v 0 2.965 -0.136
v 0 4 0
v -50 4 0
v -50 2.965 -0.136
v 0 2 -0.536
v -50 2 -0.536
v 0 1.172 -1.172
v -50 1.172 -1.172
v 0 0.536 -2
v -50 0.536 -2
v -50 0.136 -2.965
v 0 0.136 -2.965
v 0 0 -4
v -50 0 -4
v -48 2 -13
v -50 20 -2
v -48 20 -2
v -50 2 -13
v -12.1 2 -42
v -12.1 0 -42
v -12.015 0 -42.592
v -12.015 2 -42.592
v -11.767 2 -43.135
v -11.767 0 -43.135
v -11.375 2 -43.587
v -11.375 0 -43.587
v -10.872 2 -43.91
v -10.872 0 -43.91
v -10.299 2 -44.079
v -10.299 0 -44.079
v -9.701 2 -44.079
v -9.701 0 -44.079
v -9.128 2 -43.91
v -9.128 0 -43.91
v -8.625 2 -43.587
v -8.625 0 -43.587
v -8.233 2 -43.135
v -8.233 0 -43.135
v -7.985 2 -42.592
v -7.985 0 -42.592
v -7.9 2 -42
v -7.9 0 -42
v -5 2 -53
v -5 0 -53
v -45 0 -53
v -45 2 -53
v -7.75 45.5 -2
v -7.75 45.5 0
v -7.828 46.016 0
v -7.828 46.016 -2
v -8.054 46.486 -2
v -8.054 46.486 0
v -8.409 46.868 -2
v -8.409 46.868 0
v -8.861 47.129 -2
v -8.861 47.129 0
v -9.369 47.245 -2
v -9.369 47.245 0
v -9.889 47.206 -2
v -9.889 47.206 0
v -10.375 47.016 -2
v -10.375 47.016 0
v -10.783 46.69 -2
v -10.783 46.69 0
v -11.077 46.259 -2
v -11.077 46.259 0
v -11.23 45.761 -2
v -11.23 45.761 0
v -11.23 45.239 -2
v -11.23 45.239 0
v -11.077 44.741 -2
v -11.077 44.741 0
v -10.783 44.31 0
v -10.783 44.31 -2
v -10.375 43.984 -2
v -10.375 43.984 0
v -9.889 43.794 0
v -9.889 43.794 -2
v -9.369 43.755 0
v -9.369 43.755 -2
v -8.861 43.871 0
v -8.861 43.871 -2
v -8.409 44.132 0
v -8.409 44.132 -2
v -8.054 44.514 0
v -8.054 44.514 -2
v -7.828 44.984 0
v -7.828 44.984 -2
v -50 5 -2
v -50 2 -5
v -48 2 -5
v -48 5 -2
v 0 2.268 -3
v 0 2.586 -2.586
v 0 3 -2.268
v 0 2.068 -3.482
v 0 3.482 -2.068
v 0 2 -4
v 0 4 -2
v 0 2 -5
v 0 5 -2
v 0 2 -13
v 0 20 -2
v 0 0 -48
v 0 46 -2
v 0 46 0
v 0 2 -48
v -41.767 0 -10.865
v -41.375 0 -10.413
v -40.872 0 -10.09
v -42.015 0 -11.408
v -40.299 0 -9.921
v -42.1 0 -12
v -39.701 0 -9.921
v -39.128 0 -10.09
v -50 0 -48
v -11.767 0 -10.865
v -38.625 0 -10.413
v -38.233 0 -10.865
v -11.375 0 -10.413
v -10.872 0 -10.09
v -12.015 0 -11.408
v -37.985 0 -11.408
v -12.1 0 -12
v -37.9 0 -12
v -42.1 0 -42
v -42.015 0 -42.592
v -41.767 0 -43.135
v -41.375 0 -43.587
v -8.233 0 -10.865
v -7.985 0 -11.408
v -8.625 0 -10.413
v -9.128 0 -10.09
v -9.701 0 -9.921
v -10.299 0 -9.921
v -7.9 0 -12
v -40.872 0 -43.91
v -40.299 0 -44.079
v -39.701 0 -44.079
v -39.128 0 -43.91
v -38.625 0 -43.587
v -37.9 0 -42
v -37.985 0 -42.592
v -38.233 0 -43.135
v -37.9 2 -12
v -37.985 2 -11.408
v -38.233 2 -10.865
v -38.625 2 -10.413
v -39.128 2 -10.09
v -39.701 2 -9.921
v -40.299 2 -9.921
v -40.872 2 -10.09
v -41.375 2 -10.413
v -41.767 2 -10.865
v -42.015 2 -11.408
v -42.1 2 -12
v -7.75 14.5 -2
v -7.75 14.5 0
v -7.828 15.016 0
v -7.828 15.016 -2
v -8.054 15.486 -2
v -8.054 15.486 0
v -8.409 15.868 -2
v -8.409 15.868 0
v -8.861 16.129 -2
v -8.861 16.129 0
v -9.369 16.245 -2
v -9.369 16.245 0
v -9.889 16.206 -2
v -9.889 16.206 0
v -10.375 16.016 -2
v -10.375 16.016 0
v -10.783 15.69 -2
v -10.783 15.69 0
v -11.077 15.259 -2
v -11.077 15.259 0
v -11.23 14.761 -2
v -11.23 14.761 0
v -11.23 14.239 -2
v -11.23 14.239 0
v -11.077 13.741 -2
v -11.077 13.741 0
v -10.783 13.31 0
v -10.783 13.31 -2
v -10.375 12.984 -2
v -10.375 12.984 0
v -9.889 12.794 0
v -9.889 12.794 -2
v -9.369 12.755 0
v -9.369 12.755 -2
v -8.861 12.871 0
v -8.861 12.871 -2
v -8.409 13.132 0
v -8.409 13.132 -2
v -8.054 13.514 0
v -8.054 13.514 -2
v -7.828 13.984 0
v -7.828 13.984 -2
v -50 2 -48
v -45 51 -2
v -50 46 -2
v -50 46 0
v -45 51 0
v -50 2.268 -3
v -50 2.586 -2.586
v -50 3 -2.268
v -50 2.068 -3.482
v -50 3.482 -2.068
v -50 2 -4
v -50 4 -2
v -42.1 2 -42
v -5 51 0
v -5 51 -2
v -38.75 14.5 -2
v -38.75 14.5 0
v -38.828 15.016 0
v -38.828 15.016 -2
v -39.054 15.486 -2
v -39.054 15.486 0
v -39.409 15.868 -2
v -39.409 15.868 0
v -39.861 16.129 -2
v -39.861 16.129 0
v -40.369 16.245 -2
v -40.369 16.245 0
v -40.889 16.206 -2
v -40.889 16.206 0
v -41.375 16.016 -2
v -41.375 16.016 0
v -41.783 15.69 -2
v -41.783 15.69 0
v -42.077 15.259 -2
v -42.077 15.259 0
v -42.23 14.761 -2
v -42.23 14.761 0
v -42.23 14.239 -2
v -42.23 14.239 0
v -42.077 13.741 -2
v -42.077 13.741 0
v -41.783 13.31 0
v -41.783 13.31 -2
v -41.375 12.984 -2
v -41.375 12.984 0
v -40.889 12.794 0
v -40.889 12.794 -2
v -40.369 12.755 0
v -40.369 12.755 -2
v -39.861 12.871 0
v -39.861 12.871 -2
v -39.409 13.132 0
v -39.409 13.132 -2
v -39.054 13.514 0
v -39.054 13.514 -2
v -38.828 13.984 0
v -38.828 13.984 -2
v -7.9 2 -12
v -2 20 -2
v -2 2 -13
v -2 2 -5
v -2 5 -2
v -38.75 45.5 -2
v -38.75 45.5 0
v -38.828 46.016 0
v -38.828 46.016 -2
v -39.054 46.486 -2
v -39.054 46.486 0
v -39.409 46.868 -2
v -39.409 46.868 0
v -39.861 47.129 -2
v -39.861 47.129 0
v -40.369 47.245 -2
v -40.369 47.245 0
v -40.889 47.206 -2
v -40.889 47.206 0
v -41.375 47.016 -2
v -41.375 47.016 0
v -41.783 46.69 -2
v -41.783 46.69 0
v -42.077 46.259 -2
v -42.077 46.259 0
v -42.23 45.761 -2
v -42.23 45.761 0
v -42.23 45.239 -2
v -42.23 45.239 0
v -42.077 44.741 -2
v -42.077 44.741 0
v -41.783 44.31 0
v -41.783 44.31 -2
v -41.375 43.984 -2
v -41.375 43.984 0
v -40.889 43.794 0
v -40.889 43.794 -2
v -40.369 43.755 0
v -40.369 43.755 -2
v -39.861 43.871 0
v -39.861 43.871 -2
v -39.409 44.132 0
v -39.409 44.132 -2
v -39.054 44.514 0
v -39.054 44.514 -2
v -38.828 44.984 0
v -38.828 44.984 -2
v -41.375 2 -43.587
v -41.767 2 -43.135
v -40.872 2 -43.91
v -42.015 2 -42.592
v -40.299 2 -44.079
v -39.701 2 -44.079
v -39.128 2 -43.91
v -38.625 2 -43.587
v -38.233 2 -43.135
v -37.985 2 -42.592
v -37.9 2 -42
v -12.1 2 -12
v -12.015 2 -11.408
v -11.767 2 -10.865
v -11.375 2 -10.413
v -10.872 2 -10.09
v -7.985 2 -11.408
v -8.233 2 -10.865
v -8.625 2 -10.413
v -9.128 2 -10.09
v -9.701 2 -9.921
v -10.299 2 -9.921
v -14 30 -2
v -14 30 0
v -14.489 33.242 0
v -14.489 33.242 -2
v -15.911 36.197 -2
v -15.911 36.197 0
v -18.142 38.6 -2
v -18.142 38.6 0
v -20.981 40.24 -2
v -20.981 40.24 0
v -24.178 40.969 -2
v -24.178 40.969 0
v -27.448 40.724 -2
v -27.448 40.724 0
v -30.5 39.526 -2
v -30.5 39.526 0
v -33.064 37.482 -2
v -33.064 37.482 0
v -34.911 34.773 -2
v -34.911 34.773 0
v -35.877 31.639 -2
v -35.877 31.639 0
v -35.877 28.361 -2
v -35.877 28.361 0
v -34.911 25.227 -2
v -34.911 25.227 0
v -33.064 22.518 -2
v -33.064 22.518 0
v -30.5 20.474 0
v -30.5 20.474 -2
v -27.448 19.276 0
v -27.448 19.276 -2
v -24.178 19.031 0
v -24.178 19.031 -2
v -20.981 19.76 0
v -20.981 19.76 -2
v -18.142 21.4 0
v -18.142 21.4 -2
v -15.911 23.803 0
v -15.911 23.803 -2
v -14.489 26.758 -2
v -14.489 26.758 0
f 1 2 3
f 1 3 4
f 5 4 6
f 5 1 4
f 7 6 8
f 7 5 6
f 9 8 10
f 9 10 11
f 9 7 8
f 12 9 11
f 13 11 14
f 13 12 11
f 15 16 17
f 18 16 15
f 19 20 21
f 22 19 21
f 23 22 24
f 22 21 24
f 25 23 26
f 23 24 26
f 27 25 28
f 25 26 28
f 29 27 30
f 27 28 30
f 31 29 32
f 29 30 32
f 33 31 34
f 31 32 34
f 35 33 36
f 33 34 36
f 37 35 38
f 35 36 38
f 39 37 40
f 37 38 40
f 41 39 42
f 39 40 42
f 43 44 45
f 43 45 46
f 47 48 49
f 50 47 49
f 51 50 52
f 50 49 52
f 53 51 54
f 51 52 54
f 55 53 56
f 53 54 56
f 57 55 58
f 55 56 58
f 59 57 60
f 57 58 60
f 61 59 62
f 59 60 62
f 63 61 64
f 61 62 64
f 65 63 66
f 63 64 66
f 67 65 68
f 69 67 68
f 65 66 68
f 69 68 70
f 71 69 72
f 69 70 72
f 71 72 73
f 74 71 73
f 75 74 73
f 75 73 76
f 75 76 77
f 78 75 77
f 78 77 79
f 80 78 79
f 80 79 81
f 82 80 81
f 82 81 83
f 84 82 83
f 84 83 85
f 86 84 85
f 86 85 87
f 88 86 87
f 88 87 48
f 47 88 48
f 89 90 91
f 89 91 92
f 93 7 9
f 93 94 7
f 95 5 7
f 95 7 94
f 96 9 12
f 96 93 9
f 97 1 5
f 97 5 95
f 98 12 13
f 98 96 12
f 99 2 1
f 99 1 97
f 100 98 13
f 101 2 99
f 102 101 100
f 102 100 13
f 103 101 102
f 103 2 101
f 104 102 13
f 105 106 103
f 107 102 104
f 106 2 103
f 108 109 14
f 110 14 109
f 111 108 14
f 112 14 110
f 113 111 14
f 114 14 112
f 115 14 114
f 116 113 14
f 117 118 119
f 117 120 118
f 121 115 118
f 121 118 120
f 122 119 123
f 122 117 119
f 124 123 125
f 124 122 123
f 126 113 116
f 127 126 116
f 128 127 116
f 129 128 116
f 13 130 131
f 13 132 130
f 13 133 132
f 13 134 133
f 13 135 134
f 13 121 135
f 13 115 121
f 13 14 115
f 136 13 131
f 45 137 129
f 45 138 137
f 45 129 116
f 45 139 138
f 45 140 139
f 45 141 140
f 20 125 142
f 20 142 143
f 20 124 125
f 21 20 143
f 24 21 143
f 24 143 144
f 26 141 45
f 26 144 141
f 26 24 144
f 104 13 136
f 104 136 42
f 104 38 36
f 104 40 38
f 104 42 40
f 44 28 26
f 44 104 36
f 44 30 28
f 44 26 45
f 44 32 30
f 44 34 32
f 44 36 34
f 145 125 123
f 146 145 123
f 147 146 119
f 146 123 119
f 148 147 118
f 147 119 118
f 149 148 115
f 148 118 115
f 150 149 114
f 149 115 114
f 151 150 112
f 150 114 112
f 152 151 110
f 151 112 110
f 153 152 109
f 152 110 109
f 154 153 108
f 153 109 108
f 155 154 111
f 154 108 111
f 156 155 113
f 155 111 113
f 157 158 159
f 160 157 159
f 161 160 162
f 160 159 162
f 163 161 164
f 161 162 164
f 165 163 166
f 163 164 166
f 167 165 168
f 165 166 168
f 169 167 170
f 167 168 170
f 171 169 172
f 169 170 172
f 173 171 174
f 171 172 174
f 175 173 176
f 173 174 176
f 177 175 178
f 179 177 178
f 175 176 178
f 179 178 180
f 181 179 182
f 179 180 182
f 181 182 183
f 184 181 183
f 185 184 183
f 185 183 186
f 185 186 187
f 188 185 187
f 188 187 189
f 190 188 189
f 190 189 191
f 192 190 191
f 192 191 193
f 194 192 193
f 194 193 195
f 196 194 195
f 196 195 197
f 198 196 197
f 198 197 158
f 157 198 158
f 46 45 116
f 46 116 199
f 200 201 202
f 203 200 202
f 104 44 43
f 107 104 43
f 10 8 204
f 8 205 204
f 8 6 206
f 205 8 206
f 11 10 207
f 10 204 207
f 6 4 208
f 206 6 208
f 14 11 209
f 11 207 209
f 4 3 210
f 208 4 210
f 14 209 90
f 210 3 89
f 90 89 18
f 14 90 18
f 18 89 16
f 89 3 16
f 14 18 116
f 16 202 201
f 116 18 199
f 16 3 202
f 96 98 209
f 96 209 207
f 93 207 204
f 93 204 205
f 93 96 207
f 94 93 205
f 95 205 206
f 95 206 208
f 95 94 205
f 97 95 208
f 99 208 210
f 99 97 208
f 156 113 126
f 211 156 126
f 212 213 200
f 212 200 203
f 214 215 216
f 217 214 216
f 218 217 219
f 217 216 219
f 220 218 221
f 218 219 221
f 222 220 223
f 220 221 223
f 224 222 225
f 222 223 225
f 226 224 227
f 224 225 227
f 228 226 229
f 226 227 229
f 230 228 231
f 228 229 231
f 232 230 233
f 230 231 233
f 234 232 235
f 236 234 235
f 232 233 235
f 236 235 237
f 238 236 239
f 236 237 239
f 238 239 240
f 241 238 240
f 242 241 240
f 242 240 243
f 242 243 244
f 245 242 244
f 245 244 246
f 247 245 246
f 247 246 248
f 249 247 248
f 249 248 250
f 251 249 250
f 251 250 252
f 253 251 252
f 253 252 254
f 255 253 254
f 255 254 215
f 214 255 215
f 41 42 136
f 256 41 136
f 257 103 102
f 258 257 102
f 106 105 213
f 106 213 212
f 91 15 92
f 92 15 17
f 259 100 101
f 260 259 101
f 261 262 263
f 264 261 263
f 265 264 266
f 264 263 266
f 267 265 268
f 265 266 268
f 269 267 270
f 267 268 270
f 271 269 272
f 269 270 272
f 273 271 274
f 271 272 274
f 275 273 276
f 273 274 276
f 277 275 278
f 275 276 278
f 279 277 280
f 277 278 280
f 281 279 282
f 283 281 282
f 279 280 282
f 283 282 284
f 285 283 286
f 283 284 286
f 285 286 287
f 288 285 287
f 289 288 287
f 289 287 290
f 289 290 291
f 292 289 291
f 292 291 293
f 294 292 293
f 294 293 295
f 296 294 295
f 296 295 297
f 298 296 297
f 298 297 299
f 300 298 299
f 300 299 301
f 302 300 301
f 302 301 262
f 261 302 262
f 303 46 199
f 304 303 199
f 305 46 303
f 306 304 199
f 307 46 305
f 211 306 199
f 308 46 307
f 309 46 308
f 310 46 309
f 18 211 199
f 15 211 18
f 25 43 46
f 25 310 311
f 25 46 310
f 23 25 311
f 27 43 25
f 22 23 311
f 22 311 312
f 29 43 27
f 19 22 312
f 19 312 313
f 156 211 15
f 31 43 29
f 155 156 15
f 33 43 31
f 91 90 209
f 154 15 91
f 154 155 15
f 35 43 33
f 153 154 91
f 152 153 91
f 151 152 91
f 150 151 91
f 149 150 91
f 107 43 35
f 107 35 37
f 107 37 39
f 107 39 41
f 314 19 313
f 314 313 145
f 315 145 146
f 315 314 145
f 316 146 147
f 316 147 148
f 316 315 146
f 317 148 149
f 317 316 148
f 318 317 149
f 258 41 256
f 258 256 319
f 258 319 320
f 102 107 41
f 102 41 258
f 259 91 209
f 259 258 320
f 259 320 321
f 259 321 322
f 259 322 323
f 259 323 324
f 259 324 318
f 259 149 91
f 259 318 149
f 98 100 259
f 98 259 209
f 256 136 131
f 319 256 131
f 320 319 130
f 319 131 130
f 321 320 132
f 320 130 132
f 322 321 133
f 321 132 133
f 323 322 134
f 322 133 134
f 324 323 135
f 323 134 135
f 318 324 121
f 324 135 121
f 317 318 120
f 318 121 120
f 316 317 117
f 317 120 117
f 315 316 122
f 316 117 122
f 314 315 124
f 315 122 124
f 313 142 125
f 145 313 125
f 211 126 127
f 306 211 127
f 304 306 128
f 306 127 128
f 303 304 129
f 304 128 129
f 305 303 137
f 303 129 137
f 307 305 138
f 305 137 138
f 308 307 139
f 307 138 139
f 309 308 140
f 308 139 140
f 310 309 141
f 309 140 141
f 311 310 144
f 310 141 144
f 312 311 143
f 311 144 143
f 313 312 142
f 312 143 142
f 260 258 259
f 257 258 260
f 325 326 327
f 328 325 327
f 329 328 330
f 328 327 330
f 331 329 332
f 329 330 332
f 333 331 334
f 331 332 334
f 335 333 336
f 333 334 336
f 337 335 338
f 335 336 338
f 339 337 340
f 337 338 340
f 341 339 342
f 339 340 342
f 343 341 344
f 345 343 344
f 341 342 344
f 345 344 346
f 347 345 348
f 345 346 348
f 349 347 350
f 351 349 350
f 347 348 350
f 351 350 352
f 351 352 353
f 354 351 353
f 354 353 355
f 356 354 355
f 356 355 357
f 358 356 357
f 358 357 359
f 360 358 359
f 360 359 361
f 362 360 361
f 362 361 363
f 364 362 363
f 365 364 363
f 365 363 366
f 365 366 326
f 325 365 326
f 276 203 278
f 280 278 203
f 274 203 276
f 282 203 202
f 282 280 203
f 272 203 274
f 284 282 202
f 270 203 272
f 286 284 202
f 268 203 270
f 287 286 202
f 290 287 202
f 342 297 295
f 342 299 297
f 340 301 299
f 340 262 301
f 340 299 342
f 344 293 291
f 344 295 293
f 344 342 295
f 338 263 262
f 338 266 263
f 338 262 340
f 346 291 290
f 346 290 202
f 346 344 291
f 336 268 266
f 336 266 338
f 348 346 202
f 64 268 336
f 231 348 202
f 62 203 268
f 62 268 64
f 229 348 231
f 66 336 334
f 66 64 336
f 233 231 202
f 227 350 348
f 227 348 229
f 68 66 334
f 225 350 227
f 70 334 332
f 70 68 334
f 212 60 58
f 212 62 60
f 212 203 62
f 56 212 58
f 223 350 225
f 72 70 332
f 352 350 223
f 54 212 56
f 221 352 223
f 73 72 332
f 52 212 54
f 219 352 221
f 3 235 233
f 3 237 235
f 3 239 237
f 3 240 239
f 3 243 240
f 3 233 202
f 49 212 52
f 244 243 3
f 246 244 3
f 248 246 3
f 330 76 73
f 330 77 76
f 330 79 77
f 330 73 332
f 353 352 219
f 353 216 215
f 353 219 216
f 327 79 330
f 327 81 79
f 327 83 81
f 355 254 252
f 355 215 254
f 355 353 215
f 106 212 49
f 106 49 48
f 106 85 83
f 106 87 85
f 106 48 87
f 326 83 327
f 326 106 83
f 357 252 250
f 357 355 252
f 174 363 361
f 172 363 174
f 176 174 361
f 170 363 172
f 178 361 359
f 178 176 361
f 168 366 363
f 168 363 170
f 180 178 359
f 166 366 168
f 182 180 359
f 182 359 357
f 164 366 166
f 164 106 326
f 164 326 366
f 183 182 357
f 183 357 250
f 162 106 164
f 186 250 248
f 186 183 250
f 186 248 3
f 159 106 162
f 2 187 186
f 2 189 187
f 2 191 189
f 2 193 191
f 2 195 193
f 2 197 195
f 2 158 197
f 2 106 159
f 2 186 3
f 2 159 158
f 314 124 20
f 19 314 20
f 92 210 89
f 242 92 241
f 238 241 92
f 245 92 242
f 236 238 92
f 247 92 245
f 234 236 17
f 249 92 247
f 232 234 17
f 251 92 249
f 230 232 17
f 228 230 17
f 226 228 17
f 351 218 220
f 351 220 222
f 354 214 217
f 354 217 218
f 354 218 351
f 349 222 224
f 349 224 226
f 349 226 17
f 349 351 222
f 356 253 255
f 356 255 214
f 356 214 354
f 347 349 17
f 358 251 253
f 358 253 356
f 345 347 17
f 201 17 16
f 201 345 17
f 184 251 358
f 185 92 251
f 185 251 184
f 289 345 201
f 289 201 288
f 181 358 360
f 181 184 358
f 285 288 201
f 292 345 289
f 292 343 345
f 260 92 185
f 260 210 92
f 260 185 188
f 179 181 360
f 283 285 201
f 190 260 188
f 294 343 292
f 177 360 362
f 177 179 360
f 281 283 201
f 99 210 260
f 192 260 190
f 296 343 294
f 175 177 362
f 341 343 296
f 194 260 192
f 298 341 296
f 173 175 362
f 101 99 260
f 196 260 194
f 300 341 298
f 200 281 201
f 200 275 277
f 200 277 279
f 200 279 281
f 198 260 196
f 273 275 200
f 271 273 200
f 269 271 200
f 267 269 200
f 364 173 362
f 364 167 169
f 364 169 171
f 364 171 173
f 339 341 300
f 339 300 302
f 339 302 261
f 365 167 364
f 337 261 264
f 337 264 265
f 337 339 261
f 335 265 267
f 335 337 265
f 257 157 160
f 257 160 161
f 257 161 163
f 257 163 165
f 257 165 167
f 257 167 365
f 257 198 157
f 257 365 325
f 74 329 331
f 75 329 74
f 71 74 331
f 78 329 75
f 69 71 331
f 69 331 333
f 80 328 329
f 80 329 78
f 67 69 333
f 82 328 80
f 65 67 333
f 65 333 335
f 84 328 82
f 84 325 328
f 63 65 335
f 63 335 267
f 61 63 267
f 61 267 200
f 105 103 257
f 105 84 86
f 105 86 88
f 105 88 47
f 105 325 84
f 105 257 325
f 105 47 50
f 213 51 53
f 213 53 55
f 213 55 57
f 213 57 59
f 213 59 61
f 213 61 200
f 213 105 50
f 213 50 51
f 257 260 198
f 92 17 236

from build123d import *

# Parameters (mm, degrees)
BOSS_EXTRUDE1_DEPTH = 50
BOSS_EXTRUDE2_DEPTH = 2
BOSS_EXTRUDE3_DEPTH = 2
SKETCH4_R           = 11
SKETCH4_R_2         = 1.75
CUT_EXTRUDE1_DEPTH  = 5
CUT_EXTRUDE2_DEPTH  = 5
CHAMFER1_SIZE       = 5


with BuildPart() as part:
    # Sketch1 → Boss-Extrude1 (new body)
    with BuildSketch(Plane(origin=(0, 0, 0), x_dir=(0, 0, -1), z_dir=(1, 0, 0))):
        with BuildLine():
            Line((0, 51), (0, 4))
            ThreePointArc((0, 4), (1.171572875, 1.171572875), (4, 0))
            Line((4, 0), (53, 0))
            Line((53, 0), (53, 2))
            Line((53, 2), (4, 2))
            ThreePointArc((4, 2), (2.585786438, 2.585786438), (2, 4))
            Line((2, 4), (2, 51))
            Line((2, 51), (0, 51))
        make_face()
    extrude(amount=-BOSS_EXTRUDE1_DEPTH)

    # Sketch2 → Boss-Extrude2 (add)
    with BuildSketch(Plane(origin=(0, 0, 0), x_dir=(0, 0, -1), z_dir=(1, 0, 0))):
        Polygon((2, 20), (13, 2), (5, 2), (2, 5), align=None)
    extrude(amount=-BOSS_EXTRUDE2_DEPTH)

    # Sketch3 → Boss-Extrude3 (add)
    with BuildSketch(Plane.ZY.offset(50)):
        Polygon((-2, 20), (-13, 2), (-5, 2), (-2, 5), align=None)
    extrude(amount=-BOSS_EXTRUDE3_DEPTH)

    # Sketch4 → Cut-Extrude1 (cut)
    with BuildSketch(Plane.XY):
        with Locations((-25, 30)):
            Circle(SKETCH4_R)
        with Locations((-9.5, 45.5)):
            Circle(SKETCH4_R_2)
        with Locations((-40.5, 45.5)):
            Circle(SKETCH4_R_2)
        with Locations((-40.5, 14.5)):
            Circle(SKETCH4_R_2)
        with Locations((-9.5, 14.5)):
            Circle(SKETCH4_R_2)
    extrude(amount=-CUT_EXTRUDE1_DEPTH, mode=Mode.SUBTRACT)

    # Sketch5 → Cut-Extrude2 (cut)
    with BuildSketch(Plane.XZ):
        with BuildLine():
            Line((-7.9, -42), (-7.9, -12))
            ThreePointArc((-7.9, -12), (-10, -9.9), (-12.1, -12))
            Line((-12.1, -12), (-12.1, -42))
            ThreePointArc((-12.1, -42), (-10, -44.1), (-7.9, -42))
        make_face()
        with BuildLine():
            Line((-37.9, -42), (-37.9, -12))
            ThreePointArc((-37.9, -12), (-40, -9.9), (-42.1, -12))
            Line((-42.1, -12), (-42.1, -42))
            ThreePointArc((-42.1, -42), (-40, -44.1), (-37.9, -42))
        make_face()
    extrude(amount=-CUT_EXTRUDE2_DEPTH, mode=Mode.SUBTRACT)

    # Chamfer1
    chamfer1_edges = [part.edges().sort_by_distance(p)[0] for p in [
        (0, 51, -1),
        (-50, 1, -53),
        (-50, 51, -1),
        (0, 1, -53),
    ]]
    chamfer(chamfer1_edges, length=CHAMFER1_SIZE)


solid = part.part
